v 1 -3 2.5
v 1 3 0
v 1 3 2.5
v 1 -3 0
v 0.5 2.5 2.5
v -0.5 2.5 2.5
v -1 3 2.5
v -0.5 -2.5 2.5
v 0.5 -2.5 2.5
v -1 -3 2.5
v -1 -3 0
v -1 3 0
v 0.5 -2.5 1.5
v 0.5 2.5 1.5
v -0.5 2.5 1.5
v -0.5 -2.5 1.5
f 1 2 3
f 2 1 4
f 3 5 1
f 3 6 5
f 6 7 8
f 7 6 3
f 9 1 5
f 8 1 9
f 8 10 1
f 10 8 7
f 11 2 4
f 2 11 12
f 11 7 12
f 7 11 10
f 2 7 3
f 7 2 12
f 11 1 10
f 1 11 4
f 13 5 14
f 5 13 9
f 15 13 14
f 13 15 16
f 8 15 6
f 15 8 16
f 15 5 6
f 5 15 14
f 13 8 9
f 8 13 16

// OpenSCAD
module brick(brick_size = 1){
	difference(){
		cube(brick_size);
		translate([brick_size/2,brick_size/2,0])
		cube(brick_size*0.75, center = true);
	}
	$fn = 32;
	translate([brick_size/2,brick_size/2,brick_size])
	cylinder(brick_size*0.5,brick_size*0.3,brick_size*0.3, center = true);
}

module brick_block(block_size, x_blocks, y_blocks){
	for  (y = [0:y_blocks-1]){
		for (x = [0:x_blocks-1]){
			echo(x,y)
			translate([block_size*x, block_size*y,0])
			brick(block_size);	
			}
		}
}

*brick_block(2.5, 2,3);

module box_container(size, thickness){
	translate([0,0,size[2]/2+thickness])
	difference(){
		cube([size[0]+2*thickness, size[1]+2*thickness, size[2]+2*thickness], center = true);
		translate([0,0,thickness*2])
		cube(size, center = true);
	}


}

box_container([1,5,1.5], 0.5);
